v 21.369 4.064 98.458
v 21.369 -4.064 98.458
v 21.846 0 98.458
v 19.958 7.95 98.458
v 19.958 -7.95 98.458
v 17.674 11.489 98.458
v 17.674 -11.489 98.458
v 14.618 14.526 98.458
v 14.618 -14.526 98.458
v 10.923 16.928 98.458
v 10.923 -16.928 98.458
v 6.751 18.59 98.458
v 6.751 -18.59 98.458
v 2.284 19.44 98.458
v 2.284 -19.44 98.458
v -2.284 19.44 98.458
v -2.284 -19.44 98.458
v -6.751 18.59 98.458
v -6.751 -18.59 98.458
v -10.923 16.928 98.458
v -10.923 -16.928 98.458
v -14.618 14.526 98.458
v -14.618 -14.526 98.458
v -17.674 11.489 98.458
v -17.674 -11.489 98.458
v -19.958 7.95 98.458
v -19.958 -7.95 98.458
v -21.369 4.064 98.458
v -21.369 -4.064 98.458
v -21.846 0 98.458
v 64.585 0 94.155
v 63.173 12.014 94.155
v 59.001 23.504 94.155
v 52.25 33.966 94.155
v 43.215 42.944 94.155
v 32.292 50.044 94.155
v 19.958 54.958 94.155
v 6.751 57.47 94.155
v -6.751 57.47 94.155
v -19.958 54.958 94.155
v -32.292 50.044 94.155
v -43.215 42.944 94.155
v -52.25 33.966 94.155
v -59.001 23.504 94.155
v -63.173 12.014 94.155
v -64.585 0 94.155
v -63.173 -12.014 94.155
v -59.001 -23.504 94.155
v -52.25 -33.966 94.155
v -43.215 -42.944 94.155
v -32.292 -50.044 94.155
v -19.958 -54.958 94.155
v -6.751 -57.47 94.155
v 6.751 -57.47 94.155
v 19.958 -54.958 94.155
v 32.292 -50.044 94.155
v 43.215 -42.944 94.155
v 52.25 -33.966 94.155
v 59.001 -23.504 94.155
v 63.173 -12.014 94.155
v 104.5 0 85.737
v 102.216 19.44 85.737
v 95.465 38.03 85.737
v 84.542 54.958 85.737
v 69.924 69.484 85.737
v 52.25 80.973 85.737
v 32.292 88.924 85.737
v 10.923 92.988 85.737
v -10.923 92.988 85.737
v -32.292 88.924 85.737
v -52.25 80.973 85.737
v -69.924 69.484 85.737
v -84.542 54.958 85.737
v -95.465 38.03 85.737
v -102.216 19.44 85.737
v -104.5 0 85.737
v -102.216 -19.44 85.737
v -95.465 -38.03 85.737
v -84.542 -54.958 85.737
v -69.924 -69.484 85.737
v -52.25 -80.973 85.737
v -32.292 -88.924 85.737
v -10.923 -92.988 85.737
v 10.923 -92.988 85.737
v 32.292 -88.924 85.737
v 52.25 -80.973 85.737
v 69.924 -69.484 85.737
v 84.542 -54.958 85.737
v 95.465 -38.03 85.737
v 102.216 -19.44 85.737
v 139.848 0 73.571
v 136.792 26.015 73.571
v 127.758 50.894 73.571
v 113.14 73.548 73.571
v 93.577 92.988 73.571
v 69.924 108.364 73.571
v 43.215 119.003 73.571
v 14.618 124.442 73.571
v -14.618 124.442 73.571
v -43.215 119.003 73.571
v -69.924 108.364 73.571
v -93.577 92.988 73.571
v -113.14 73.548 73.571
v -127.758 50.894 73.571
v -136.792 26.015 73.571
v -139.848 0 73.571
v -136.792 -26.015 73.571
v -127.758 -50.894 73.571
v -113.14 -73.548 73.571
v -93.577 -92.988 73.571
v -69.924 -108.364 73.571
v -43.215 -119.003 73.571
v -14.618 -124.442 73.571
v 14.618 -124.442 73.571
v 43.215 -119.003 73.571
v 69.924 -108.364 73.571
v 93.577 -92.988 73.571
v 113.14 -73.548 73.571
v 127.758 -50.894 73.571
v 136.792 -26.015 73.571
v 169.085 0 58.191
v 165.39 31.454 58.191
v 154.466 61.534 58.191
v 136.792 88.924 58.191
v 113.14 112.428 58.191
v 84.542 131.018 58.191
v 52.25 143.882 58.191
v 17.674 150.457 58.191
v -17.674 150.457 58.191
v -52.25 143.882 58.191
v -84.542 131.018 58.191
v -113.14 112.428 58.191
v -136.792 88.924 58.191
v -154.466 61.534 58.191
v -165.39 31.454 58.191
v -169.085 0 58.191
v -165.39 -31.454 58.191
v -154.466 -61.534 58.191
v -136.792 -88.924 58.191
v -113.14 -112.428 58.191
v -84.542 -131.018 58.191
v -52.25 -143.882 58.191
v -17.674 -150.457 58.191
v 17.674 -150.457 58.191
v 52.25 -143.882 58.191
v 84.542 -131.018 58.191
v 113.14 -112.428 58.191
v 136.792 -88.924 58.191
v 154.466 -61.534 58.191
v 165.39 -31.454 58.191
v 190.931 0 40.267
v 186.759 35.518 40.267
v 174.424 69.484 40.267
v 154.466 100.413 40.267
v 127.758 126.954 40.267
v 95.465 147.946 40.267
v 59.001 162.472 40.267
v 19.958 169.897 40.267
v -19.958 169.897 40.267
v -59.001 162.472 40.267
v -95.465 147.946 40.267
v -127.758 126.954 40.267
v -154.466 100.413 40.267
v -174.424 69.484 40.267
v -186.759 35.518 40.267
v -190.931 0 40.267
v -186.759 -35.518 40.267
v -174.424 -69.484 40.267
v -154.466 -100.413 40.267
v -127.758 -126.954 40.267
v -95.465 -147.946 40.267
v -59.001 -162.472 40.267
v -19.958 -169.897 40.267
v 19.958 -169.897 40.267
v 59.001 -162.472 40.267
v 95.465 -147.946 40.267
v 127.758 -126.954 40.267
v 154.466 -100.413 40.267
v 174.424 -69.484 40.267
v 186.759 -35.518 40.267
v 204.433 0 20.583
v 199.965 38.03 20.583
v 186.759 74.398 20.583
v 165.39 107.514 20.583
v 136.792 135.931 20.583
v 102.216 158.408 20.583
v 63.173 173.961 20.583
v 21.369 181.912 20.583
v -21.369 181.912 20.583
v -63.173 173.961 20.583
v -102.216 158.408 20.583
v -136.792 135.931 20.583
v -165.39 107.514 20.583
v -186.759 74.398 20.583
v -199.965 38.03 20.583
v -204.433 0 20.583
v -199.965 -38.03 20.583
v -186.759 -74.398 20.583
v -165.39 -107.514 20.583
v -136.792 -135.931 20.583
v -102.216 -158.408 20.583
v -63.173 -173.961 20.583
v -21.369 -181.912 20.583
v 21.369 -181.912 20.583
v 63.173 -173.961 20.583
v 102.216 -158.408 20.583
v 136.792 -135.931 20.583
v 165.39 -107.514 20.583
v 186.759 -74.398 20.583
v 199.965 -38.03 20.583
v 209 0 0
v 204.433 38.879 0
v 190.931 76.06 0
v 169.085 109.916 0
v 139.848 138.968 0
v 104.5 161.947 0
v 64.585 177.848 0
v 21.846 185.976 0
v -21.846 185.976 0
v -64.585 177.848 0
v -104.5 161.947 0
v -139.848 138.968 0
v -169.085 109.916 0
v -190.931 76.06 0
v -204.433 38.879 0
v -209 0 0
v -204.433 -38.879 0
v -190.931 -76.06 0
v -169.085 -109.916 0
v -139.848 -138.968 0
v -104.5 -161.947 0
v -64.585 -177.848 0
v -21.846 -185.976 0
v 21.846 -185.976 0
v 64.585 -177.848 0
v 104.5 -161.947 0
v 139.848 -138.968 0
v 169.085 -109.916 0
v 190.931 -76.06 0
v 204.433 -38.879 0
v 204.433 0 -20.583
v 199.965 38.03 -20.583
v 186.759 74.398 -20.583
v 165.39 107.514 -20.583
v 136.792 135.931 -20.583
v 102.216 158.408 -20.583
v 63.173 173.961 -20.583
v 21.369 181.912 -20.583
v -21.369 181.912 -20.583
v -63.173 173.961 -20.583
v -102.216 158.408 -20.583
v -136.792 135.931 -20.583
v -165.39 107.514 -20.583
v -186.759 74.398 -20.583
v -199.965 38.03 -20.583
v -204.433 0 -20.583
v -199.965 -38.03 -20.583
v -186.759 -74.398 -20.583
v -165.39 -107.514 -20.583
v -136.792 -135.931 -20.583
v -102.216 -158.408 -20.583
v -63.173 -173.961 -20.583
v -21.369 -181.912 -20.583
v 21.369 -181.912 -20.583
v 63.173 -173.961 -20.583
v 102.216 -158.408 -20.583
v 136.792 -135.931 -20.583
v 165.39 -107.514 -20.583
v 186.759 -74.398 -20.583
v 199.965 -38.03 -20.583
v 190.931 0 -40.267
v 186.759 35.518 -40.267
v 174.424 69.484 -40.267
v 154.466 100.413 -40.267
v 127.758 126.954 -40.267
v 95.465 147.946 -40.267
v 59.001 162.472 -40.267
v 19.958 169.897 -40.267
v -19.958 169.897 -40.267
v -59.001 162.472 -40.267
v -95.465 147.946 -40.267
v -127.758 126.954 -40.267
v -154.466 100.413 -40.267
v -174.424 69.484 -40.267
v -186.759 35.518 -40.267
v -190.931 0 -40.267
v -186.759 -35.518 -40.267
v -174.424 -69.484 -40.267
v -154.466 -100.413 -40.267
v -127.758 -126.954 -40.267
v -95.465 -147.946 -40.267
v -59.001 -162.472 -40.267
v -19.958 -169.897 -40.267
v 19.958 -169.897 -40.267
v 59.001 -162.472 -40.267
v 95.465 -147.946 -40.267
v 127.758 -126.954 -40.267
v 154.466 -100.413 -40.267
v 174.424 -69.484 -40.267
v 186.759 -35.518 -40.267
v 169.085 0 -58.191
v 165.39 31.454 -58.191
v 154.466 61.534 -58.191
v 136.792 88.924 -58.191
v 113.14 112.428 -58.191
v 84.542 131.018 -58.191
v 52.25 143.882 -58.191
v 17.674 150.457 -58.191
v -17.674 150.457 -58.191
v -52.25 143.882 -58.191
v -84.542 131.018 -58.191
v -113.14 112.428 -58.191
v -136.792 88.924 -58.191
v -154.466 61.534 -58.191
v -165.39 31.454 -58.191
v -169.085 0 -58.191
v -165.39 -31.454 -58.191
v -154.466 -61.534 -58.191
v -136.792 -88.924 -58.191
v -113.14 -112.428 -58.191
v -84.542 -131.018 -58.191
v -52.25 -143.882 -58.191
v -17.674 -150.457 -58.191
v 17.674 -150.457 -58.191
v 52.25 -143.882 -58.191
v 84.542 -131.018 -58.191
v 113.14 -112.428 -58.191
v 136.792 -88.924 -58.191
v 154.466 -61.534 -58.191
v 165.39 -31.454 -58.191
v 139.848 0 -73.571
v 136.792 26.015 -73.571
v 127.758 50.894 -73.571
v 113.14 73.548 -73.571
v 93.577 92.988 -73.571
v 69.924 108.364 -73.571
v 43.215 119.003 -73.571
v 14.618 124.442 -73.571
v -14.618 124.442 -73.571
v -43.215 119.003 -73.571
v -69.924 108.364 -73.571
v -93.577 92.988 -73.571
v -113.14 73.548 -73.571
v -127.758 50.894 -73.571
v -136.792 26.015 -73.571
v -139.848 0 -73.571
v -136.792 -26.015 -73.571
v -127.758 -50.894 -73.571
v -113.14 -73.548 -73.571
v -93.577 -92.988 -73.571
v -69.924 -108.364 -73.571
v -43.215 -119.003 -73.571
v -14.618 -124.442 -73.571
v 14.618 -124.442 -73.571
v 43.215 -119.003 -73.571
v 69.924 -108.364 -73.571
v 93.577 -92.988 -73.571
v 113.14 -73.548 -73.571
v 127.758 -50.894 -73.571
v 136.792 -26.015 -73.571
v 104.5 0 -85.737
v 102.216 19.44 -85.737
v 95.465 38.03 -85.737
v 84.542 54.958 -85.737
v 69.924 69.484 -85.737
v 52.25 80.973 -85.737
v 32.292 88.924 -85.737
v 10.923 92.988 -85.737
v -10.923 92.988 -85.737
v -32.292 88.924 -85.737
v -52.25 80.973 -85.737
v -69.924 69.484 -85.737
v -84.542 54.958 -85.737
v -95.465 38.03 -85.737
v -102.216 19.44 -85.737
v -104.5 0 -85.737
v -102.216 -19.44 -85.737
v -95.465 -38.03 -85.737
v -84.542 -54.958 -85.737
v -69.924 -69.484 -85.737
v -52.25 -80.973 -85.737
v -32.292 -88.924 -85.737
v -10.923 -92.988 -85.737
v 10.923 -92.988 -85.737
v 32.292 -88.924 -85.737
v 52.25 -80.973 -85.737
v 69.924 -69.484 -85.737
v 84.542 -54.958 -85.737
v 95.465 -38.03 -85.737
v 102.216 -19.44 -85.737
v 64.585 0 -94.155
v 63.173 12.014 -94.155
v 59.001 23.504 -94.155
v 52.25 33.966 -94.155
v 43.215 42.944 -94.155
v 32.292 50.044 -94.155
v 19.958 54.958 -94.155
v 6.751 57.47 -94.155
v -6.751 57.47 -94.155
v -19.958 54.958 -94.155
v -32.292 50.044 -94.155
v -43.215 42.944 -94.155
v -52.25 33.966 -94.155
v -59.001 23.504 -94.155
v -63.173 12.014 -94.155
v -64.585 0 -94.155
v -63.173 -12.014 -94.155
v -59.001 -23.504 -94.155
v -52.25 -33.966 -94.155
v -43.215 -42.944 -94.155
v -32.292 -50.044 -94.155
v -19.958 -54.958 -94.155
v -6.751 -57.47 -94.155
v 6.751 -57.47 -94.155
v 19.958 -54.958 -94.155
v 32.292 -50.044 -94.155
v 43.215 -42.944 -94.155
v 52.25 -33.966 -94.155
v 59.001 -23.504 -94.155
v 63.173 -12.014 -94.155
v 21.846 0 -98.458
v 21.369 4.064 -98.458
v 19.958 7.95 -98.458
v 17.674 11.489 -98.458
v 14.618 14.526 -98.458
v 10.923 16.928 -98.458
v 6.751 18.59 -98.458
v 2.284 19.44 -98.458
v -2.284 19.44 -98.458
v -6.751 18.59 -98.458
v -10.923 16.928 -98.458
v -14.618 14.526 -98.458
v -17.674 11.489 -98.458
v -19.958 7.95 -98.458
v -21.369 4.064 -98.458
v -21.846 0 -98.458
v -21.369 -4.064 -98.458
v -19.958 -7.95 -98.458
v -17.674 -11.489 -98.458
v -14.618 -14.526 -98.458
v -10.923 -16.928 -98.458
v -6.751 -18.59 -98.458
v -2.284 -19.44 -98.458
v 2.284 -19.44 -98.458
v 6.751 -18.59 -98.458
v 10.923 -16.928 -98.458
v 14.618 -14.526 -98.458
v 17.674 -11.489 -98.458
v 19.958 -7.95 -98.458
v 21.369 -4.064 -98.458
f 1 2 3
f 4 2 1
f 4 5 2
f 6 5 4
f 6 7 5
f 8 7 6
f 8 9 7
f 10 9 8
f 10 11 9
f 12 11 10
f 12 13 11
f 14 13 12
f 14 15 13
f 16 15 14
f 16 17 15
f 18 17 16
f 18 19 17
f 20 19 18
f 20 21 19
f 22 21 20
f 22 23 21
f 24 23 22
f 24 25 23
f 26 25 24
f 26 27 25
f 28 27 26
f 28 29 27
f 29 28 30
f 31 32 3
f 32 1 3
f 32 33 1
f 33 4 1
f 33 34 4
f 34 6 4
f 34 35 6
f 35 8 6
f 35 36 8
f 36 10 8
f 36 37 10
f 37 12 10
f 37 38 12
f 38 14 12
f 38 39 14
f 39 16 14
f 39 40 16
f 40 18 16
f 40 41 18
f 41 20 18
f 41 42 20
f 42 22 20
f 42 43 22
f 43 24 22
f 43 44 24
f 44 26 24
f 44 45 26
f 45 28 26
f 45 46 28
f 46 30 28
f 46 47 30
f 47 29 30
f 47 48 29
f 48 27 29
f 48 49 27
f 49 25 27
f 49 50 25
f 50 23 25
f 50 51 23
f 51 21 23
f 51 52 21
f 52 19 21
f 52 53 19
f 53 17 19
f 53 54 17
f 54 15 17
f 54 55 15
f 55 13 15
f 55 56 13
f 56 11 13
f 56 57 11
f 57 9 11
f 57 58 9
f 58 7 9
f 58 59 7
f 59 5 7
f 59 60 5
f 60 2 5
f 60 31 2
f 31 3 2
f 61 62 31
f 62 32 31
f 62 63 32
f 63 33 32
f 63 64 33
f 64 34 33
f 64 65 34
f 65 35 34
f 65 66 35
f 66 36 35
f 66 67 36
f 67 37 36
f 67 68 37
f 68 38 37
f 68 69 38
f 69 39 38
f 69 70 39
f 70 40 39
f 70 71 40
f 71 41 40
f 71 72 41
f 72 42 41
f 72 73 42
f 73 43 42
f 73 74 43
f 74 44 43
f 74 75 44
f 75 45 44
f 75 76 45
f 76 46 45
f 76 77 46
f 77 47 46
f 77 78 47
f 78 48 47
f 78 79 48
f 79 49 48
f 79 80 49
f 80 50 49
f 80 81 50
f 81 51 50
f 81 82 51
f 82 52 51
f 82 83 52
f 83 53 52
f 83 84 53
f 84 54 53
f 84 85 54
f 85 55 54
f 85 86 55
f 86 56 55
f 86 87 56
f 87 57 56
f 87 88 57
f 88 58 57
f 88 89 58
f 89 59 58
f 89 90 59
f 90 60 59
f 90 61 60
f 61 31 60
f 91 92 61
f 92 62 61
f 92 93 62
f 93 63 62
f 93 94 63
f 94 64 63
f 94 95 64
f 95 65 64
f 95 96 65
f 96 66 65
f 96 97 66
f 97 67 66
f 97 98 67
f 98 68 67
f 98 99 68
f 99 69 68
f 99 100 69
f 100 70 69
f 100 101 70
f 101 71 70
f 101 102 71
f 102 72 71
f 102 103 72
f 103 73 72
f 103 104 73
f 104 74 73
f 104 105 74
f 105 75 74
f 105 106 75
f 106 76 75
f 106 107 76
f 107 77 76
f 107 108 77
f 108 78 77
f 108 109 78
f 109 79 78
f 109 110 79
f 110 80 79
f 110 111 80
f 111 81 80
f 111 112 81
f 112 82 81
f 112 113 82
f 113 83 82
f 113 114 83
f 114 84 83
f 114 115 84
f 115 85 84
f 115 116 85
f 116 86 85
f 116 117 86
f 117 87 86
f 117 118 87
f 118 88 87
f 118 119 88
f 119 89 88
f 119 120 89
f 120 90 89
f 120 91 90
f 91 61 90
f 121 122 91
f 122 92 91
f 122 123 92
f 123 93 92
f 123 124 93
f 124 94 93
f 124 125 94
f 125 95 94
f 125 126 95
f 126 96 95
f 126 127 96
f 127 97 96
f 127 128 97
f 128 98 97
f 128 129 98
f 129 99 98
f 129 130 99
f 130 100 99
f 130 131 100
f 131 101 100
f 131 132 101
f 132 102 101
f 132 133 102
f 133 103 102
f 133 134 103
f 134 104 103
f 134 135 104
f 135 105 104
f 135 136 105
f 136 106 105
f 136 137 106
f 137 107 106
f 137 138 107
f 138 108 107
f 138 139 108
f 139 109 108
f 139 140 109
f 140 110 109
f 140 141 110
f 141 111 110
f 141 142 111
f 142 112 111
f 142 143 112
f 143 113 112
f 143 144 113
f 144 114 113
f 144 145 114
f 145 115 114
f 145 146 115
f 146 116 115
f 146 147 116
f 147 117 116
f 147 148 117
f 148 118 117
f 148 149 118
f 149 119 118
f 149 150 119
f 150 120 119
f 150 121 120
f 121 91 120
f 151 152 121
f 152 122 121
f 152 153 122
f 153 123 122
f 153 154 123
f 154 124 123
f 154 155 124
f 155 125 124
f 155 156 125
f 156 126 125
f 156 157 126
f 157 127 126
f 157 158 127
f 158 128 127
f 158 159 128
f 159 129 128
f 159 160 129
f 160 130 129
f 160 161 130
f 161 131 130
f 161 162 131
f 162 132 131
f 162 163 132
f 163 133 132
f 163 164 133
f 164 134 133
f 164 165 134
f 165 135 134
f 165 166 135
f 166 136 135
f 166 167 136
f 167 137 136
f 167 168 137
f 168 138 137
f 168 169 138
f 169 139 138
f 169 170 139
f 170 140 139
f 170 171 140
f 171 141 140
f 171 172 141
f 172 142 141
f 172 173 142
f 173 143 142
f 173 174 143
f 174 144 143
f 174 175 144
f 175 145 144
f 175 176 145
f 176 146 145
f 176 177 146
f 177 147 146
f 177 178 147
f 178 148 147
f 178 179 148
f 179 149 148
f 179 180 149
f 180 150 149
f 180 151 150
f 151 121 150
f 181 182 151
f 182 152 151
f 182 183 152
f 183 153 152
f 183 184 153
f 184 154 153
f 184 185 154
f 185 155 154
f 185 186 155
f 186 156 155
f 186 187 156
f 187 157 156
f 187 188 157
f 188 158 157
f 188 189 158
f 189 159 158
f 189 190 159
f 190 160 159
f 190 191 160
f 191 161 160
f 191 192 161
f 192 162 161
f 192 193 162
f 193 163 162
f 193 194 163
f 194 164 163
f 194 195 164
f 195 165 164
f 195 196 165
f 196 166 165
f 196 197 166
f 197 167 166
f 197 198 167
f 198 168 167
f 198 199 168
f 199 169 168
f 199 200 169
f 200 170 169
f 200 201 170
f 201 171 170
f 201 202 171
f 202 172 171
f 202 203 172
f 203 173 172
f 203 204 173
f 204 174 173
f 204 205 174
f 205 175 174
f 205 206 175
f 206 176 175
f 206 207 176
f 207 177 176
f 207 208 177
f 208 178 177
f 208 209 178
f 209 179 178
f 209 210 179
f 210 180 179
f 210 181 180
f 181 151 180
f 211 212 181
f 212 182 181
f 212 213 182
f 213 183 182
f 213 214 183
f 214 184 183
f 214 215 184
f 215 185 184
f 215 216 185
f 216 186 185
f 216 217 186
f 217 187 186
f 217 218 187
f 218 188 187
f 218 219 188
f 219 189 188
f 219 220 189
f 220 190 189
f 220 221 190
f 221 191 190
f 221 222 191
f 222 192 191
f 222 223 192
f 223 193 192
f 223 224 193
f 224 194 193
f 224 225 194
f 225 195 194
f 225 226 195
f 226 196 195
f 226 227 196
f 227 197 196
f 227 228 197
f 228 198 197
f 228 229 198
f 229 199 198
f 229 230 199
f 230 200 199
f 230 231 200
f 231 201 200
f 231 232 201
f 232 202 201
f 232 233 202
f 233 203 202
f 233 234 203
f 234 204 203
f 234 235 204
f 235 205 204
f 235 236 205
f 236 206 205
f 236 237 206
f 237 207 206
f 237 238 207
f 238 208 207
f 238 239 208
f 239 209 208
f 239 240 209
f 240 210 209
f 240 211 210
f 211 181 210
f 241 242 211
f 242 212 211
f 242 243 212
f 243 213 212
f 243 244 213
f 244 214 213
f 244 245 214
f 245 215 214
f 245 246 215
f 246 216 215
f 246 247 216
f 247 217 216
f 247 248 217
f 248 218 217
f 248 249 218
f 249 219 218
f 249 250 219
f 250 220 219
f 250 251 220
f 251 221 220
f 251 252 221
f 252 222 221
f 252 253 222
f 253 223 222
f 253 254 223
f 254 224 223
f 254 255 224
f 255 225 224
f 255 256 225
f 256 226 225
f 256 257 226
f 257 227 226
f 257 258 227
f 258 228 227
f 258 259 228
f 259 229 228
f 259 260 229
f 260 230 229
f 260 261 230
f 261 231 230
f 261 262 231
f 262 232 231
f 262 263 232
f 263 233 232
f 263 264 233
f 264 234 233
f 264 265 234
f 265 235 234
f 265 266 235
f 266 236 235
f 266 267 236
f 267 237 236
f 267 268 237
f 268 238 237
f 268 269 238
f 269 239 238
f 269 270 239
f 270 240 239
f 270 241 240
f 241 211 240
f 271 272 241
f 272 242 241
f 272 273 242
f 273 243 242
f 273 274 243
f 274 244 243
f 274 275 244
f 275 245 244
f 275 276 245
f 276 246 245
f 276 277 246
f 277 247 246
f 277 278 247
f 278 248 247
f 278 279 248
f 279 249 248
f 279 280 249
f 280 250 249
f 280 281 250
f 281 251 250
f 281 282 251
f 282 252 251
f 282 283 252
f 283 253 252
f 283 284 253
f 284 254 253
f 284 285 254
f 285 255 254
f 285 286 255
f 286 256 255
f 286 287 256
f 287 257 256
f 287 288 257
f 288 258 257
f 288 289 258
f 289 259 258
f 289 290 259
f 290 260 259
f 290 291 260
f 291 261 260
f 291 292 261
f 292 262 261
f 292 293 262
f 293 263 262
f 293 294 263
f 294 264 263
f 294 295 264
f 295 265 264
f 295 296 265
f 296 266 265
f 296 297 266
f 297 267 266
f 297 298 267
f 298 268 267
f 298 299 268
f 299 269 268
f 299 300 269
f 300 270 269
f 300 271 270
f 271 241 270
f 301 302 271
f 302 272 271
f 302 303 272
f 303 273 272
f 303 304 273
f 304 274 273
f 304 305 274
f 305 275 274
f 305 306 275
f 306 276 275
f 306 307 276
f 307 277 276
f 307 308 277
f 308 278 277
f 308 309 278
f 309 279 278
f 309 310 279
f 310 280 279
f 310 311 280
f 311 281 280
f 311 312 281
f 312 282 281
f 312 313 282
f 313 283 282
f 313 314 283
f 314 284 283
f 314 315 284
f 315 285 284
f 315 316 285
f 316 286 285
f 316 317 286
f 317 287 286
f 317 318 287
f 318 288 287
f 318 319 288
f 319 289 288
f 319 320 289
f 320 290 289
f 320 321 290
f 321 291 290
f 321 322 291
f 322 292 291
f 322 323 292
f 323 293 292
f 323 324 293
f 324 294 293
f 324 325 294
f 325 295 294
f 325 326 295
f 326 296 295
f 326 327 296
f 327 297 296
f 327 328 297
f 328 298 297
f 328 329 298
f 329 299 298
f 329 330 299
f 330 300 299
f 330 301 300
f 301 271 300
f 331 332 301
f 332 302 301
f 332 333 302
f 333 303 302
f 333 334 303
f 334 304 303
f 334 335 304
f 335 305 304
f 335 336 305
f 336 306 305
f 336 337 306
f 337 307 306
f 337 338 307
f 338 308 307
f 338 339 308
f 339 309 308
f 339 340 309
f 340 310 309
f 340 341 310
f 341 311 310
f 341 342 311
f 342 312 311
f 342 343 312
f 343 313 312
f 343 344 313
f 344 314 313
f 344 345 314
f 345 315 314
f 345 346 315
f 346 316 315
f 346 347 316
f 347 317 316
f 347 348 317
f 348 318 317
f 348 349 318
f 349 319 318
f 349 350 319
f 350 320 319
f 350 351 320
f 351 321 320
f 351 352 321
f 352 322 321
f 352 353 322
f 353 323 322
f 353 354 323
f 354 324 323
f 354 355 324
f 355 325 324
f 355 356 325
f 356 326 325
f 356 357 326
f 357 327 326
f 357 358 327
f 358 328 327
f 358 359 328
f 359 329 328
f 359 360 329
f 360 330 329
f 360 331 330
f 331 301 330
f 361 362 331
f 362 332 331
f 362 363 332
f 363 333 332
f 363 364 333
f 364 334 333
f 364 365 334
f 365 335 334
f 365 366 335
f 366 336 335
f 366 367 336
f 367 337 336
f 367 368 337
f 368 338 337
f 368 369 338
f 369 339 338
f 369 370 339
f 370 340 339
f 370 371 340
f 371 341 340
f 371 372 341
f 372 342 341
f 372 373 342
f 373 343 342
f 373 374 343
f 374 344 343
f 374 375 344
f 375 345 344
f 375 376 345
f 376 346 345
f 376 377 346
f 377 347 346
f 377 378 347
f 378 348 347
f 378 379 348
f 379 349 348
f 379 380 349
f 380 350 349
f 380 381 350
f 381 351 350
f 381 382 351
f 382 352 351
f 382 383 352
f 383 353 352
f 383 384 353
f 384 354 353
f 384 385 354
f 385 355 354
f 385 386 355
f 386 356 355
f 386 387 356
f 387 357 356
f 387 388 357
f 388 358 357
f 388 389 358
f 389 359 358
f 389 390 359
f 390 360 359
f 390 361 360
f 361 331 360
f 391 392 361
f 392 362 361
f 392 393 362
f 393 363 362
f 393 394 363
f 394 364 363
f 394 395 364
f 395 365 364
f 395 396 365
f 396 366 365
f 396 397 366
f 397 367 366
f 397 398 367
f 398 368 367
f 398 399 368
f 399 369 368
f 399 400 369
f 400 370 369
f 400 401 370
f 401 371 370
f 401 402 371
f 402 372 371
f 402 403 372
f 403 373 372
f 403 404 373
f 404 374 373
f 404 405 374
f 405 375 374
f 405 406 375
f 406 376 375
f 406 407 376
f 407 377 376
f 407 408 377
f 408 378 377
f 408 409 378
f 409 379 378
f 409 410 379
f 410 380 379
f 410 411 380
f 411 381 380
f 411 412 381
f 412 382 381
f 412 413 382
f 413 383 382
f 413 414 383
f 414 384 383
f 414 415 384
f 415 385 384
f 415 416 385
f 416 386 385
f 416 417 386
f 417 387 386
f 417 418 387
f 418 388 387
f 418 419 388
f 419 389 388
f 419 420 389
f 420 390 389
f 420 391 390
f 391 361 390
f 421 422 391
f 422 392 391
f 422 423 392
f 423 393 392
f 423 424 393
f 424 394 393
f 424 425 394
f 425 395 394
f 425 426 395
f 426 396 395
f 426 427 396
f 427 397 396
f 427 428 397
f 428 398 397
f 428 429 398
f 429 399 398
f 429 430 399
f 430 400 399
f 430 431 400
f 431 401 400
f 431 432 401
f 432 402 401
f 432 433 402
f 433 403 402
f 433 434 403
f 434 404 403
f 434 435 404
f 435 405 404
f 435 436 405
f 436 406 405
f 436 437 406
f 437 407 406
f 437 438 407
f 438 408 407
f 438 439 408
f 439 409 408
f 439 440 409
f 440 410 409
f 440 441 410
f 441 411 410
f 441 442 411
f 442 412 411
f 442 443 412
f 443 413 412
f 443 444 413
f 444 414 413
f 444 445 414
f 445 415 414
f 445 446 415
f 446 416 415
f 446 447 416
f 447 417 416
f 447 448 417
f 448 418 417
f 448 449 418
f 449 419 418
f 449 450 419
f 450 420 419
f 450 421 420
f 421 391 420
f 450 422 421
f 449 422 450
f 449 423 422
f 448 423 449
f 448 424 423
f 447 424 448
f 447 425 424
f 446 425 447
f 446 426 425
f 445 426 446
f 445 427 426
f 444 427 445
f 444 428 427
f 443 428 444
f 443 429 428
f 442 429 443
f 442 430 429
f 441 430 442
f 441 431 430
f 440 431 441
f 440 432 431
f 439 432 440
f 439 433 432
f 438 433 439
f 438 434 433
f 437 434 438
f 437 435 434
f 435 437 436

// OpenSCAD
// Generated by SolidPython 1.0.1 on 2020-07-29 00:46:54


scale(v = [19, 17, 9]) {
	sphere(r = 11);
}
/***********************************************
*********      SolidPython code:      **********
************************************************
 
# import packages: SolidPython
from solid import *
from solid.utils import *
from itertools import chain, combinations, permutations


class Resize:

    def __init__(self, scad_file):
        self.scad_file = scad_file
        #self.scad_file = import_scad(scad_file)
        # cone/cylinder param:
        self.r1 = 0
        self.r2 = 0
        self.h = 0
        # rectangular prism param:
        self.w = 0
        self.l = 0
        # ellipse param:
        self.r = 0

    # import OpenScad code (file name corresponds to shape)


    # classify shape + parameters
    def assign(self, param1, param2, param3):
        if self.scad_file == 'cone.scad':
            self.r1 = param1
            self.r2 = param2
            self.h = param3
        elif self.scad_file == 'cylinder.scad':
            self.r1 = param1
            self.r2 = param2
            self.h = param3
        elif self.scad_file == 'rectangularPrism.scad':
            self.h = param1
            self.l = param2
            self.w = param3
        else:
            self.r = param1
            self.h = param2

    # resize parameters
    def iterate(self):
        x = range(3, 20, 2)
        i = 1
        if self.scad_file == 'cone.scad':
            tempList = list(permutations(x, 2))
            for temp in tempList:
                param1 = temp[0]
                param2 = temp[1]
                filepath = 'produced_scad_files/' + 'cone' + str(param1) + '_' + str(param2) + '_' + '.scad'
                scad_render_to_file(cylinder(h=param1, r1=param2, r2=0), filepath)

        elif self.scad_file == 'cylinder.scad':
            tempList = list(permutations(x, 3))
            for temp in tempList:
                param1 = temp[0]
                param2 = temp[1]
                filepath = 'produced_scad_files/' + 'cylinder' + str(param1) + '_' + str(param2) + '_' + '.scad'
                scad_render_to_file(cylinder(h=param1, r1=param2, r2=param2), filepath)

        elif self.scad_file == 'rectangularPrism.scad':
            tempList = list(permutations(x, 3))
            for temp in tempList:
                param1 = temp[0]
                param2 = temp[1]
                param3 = temp[2]
                filepath = 'produced_scad_files/' + 'rectangularPrism' + str(param1) + '_' + str(param2) + '_' + str(
                    param3) + '.scad'
                scad_render_to_file(cube(size=(param1, param2, param3)), filepath)

        elif self.scad_file == 'ellipse.scad':
            tempList = list(permutations(x, 4))
            for temp in tempList:
                param1 = temp[0]
                param2 = temp[1]
                param3 = temp[2]
                param4 = temp[3]
                filepath = 'produced_scad_files/' + 'ellipse' + str(param1) + '_' + str(param2) + '_' + str(param3) + '_' + str(param4) + '.scad'
                scad_render_to_file(scale([param1, param2, param3])(sphere(r=param4)), filepath)

    def render_to_scadfile(self):
        scad_render_to_file(scad, 'example.scad') 
 
************************************************/
